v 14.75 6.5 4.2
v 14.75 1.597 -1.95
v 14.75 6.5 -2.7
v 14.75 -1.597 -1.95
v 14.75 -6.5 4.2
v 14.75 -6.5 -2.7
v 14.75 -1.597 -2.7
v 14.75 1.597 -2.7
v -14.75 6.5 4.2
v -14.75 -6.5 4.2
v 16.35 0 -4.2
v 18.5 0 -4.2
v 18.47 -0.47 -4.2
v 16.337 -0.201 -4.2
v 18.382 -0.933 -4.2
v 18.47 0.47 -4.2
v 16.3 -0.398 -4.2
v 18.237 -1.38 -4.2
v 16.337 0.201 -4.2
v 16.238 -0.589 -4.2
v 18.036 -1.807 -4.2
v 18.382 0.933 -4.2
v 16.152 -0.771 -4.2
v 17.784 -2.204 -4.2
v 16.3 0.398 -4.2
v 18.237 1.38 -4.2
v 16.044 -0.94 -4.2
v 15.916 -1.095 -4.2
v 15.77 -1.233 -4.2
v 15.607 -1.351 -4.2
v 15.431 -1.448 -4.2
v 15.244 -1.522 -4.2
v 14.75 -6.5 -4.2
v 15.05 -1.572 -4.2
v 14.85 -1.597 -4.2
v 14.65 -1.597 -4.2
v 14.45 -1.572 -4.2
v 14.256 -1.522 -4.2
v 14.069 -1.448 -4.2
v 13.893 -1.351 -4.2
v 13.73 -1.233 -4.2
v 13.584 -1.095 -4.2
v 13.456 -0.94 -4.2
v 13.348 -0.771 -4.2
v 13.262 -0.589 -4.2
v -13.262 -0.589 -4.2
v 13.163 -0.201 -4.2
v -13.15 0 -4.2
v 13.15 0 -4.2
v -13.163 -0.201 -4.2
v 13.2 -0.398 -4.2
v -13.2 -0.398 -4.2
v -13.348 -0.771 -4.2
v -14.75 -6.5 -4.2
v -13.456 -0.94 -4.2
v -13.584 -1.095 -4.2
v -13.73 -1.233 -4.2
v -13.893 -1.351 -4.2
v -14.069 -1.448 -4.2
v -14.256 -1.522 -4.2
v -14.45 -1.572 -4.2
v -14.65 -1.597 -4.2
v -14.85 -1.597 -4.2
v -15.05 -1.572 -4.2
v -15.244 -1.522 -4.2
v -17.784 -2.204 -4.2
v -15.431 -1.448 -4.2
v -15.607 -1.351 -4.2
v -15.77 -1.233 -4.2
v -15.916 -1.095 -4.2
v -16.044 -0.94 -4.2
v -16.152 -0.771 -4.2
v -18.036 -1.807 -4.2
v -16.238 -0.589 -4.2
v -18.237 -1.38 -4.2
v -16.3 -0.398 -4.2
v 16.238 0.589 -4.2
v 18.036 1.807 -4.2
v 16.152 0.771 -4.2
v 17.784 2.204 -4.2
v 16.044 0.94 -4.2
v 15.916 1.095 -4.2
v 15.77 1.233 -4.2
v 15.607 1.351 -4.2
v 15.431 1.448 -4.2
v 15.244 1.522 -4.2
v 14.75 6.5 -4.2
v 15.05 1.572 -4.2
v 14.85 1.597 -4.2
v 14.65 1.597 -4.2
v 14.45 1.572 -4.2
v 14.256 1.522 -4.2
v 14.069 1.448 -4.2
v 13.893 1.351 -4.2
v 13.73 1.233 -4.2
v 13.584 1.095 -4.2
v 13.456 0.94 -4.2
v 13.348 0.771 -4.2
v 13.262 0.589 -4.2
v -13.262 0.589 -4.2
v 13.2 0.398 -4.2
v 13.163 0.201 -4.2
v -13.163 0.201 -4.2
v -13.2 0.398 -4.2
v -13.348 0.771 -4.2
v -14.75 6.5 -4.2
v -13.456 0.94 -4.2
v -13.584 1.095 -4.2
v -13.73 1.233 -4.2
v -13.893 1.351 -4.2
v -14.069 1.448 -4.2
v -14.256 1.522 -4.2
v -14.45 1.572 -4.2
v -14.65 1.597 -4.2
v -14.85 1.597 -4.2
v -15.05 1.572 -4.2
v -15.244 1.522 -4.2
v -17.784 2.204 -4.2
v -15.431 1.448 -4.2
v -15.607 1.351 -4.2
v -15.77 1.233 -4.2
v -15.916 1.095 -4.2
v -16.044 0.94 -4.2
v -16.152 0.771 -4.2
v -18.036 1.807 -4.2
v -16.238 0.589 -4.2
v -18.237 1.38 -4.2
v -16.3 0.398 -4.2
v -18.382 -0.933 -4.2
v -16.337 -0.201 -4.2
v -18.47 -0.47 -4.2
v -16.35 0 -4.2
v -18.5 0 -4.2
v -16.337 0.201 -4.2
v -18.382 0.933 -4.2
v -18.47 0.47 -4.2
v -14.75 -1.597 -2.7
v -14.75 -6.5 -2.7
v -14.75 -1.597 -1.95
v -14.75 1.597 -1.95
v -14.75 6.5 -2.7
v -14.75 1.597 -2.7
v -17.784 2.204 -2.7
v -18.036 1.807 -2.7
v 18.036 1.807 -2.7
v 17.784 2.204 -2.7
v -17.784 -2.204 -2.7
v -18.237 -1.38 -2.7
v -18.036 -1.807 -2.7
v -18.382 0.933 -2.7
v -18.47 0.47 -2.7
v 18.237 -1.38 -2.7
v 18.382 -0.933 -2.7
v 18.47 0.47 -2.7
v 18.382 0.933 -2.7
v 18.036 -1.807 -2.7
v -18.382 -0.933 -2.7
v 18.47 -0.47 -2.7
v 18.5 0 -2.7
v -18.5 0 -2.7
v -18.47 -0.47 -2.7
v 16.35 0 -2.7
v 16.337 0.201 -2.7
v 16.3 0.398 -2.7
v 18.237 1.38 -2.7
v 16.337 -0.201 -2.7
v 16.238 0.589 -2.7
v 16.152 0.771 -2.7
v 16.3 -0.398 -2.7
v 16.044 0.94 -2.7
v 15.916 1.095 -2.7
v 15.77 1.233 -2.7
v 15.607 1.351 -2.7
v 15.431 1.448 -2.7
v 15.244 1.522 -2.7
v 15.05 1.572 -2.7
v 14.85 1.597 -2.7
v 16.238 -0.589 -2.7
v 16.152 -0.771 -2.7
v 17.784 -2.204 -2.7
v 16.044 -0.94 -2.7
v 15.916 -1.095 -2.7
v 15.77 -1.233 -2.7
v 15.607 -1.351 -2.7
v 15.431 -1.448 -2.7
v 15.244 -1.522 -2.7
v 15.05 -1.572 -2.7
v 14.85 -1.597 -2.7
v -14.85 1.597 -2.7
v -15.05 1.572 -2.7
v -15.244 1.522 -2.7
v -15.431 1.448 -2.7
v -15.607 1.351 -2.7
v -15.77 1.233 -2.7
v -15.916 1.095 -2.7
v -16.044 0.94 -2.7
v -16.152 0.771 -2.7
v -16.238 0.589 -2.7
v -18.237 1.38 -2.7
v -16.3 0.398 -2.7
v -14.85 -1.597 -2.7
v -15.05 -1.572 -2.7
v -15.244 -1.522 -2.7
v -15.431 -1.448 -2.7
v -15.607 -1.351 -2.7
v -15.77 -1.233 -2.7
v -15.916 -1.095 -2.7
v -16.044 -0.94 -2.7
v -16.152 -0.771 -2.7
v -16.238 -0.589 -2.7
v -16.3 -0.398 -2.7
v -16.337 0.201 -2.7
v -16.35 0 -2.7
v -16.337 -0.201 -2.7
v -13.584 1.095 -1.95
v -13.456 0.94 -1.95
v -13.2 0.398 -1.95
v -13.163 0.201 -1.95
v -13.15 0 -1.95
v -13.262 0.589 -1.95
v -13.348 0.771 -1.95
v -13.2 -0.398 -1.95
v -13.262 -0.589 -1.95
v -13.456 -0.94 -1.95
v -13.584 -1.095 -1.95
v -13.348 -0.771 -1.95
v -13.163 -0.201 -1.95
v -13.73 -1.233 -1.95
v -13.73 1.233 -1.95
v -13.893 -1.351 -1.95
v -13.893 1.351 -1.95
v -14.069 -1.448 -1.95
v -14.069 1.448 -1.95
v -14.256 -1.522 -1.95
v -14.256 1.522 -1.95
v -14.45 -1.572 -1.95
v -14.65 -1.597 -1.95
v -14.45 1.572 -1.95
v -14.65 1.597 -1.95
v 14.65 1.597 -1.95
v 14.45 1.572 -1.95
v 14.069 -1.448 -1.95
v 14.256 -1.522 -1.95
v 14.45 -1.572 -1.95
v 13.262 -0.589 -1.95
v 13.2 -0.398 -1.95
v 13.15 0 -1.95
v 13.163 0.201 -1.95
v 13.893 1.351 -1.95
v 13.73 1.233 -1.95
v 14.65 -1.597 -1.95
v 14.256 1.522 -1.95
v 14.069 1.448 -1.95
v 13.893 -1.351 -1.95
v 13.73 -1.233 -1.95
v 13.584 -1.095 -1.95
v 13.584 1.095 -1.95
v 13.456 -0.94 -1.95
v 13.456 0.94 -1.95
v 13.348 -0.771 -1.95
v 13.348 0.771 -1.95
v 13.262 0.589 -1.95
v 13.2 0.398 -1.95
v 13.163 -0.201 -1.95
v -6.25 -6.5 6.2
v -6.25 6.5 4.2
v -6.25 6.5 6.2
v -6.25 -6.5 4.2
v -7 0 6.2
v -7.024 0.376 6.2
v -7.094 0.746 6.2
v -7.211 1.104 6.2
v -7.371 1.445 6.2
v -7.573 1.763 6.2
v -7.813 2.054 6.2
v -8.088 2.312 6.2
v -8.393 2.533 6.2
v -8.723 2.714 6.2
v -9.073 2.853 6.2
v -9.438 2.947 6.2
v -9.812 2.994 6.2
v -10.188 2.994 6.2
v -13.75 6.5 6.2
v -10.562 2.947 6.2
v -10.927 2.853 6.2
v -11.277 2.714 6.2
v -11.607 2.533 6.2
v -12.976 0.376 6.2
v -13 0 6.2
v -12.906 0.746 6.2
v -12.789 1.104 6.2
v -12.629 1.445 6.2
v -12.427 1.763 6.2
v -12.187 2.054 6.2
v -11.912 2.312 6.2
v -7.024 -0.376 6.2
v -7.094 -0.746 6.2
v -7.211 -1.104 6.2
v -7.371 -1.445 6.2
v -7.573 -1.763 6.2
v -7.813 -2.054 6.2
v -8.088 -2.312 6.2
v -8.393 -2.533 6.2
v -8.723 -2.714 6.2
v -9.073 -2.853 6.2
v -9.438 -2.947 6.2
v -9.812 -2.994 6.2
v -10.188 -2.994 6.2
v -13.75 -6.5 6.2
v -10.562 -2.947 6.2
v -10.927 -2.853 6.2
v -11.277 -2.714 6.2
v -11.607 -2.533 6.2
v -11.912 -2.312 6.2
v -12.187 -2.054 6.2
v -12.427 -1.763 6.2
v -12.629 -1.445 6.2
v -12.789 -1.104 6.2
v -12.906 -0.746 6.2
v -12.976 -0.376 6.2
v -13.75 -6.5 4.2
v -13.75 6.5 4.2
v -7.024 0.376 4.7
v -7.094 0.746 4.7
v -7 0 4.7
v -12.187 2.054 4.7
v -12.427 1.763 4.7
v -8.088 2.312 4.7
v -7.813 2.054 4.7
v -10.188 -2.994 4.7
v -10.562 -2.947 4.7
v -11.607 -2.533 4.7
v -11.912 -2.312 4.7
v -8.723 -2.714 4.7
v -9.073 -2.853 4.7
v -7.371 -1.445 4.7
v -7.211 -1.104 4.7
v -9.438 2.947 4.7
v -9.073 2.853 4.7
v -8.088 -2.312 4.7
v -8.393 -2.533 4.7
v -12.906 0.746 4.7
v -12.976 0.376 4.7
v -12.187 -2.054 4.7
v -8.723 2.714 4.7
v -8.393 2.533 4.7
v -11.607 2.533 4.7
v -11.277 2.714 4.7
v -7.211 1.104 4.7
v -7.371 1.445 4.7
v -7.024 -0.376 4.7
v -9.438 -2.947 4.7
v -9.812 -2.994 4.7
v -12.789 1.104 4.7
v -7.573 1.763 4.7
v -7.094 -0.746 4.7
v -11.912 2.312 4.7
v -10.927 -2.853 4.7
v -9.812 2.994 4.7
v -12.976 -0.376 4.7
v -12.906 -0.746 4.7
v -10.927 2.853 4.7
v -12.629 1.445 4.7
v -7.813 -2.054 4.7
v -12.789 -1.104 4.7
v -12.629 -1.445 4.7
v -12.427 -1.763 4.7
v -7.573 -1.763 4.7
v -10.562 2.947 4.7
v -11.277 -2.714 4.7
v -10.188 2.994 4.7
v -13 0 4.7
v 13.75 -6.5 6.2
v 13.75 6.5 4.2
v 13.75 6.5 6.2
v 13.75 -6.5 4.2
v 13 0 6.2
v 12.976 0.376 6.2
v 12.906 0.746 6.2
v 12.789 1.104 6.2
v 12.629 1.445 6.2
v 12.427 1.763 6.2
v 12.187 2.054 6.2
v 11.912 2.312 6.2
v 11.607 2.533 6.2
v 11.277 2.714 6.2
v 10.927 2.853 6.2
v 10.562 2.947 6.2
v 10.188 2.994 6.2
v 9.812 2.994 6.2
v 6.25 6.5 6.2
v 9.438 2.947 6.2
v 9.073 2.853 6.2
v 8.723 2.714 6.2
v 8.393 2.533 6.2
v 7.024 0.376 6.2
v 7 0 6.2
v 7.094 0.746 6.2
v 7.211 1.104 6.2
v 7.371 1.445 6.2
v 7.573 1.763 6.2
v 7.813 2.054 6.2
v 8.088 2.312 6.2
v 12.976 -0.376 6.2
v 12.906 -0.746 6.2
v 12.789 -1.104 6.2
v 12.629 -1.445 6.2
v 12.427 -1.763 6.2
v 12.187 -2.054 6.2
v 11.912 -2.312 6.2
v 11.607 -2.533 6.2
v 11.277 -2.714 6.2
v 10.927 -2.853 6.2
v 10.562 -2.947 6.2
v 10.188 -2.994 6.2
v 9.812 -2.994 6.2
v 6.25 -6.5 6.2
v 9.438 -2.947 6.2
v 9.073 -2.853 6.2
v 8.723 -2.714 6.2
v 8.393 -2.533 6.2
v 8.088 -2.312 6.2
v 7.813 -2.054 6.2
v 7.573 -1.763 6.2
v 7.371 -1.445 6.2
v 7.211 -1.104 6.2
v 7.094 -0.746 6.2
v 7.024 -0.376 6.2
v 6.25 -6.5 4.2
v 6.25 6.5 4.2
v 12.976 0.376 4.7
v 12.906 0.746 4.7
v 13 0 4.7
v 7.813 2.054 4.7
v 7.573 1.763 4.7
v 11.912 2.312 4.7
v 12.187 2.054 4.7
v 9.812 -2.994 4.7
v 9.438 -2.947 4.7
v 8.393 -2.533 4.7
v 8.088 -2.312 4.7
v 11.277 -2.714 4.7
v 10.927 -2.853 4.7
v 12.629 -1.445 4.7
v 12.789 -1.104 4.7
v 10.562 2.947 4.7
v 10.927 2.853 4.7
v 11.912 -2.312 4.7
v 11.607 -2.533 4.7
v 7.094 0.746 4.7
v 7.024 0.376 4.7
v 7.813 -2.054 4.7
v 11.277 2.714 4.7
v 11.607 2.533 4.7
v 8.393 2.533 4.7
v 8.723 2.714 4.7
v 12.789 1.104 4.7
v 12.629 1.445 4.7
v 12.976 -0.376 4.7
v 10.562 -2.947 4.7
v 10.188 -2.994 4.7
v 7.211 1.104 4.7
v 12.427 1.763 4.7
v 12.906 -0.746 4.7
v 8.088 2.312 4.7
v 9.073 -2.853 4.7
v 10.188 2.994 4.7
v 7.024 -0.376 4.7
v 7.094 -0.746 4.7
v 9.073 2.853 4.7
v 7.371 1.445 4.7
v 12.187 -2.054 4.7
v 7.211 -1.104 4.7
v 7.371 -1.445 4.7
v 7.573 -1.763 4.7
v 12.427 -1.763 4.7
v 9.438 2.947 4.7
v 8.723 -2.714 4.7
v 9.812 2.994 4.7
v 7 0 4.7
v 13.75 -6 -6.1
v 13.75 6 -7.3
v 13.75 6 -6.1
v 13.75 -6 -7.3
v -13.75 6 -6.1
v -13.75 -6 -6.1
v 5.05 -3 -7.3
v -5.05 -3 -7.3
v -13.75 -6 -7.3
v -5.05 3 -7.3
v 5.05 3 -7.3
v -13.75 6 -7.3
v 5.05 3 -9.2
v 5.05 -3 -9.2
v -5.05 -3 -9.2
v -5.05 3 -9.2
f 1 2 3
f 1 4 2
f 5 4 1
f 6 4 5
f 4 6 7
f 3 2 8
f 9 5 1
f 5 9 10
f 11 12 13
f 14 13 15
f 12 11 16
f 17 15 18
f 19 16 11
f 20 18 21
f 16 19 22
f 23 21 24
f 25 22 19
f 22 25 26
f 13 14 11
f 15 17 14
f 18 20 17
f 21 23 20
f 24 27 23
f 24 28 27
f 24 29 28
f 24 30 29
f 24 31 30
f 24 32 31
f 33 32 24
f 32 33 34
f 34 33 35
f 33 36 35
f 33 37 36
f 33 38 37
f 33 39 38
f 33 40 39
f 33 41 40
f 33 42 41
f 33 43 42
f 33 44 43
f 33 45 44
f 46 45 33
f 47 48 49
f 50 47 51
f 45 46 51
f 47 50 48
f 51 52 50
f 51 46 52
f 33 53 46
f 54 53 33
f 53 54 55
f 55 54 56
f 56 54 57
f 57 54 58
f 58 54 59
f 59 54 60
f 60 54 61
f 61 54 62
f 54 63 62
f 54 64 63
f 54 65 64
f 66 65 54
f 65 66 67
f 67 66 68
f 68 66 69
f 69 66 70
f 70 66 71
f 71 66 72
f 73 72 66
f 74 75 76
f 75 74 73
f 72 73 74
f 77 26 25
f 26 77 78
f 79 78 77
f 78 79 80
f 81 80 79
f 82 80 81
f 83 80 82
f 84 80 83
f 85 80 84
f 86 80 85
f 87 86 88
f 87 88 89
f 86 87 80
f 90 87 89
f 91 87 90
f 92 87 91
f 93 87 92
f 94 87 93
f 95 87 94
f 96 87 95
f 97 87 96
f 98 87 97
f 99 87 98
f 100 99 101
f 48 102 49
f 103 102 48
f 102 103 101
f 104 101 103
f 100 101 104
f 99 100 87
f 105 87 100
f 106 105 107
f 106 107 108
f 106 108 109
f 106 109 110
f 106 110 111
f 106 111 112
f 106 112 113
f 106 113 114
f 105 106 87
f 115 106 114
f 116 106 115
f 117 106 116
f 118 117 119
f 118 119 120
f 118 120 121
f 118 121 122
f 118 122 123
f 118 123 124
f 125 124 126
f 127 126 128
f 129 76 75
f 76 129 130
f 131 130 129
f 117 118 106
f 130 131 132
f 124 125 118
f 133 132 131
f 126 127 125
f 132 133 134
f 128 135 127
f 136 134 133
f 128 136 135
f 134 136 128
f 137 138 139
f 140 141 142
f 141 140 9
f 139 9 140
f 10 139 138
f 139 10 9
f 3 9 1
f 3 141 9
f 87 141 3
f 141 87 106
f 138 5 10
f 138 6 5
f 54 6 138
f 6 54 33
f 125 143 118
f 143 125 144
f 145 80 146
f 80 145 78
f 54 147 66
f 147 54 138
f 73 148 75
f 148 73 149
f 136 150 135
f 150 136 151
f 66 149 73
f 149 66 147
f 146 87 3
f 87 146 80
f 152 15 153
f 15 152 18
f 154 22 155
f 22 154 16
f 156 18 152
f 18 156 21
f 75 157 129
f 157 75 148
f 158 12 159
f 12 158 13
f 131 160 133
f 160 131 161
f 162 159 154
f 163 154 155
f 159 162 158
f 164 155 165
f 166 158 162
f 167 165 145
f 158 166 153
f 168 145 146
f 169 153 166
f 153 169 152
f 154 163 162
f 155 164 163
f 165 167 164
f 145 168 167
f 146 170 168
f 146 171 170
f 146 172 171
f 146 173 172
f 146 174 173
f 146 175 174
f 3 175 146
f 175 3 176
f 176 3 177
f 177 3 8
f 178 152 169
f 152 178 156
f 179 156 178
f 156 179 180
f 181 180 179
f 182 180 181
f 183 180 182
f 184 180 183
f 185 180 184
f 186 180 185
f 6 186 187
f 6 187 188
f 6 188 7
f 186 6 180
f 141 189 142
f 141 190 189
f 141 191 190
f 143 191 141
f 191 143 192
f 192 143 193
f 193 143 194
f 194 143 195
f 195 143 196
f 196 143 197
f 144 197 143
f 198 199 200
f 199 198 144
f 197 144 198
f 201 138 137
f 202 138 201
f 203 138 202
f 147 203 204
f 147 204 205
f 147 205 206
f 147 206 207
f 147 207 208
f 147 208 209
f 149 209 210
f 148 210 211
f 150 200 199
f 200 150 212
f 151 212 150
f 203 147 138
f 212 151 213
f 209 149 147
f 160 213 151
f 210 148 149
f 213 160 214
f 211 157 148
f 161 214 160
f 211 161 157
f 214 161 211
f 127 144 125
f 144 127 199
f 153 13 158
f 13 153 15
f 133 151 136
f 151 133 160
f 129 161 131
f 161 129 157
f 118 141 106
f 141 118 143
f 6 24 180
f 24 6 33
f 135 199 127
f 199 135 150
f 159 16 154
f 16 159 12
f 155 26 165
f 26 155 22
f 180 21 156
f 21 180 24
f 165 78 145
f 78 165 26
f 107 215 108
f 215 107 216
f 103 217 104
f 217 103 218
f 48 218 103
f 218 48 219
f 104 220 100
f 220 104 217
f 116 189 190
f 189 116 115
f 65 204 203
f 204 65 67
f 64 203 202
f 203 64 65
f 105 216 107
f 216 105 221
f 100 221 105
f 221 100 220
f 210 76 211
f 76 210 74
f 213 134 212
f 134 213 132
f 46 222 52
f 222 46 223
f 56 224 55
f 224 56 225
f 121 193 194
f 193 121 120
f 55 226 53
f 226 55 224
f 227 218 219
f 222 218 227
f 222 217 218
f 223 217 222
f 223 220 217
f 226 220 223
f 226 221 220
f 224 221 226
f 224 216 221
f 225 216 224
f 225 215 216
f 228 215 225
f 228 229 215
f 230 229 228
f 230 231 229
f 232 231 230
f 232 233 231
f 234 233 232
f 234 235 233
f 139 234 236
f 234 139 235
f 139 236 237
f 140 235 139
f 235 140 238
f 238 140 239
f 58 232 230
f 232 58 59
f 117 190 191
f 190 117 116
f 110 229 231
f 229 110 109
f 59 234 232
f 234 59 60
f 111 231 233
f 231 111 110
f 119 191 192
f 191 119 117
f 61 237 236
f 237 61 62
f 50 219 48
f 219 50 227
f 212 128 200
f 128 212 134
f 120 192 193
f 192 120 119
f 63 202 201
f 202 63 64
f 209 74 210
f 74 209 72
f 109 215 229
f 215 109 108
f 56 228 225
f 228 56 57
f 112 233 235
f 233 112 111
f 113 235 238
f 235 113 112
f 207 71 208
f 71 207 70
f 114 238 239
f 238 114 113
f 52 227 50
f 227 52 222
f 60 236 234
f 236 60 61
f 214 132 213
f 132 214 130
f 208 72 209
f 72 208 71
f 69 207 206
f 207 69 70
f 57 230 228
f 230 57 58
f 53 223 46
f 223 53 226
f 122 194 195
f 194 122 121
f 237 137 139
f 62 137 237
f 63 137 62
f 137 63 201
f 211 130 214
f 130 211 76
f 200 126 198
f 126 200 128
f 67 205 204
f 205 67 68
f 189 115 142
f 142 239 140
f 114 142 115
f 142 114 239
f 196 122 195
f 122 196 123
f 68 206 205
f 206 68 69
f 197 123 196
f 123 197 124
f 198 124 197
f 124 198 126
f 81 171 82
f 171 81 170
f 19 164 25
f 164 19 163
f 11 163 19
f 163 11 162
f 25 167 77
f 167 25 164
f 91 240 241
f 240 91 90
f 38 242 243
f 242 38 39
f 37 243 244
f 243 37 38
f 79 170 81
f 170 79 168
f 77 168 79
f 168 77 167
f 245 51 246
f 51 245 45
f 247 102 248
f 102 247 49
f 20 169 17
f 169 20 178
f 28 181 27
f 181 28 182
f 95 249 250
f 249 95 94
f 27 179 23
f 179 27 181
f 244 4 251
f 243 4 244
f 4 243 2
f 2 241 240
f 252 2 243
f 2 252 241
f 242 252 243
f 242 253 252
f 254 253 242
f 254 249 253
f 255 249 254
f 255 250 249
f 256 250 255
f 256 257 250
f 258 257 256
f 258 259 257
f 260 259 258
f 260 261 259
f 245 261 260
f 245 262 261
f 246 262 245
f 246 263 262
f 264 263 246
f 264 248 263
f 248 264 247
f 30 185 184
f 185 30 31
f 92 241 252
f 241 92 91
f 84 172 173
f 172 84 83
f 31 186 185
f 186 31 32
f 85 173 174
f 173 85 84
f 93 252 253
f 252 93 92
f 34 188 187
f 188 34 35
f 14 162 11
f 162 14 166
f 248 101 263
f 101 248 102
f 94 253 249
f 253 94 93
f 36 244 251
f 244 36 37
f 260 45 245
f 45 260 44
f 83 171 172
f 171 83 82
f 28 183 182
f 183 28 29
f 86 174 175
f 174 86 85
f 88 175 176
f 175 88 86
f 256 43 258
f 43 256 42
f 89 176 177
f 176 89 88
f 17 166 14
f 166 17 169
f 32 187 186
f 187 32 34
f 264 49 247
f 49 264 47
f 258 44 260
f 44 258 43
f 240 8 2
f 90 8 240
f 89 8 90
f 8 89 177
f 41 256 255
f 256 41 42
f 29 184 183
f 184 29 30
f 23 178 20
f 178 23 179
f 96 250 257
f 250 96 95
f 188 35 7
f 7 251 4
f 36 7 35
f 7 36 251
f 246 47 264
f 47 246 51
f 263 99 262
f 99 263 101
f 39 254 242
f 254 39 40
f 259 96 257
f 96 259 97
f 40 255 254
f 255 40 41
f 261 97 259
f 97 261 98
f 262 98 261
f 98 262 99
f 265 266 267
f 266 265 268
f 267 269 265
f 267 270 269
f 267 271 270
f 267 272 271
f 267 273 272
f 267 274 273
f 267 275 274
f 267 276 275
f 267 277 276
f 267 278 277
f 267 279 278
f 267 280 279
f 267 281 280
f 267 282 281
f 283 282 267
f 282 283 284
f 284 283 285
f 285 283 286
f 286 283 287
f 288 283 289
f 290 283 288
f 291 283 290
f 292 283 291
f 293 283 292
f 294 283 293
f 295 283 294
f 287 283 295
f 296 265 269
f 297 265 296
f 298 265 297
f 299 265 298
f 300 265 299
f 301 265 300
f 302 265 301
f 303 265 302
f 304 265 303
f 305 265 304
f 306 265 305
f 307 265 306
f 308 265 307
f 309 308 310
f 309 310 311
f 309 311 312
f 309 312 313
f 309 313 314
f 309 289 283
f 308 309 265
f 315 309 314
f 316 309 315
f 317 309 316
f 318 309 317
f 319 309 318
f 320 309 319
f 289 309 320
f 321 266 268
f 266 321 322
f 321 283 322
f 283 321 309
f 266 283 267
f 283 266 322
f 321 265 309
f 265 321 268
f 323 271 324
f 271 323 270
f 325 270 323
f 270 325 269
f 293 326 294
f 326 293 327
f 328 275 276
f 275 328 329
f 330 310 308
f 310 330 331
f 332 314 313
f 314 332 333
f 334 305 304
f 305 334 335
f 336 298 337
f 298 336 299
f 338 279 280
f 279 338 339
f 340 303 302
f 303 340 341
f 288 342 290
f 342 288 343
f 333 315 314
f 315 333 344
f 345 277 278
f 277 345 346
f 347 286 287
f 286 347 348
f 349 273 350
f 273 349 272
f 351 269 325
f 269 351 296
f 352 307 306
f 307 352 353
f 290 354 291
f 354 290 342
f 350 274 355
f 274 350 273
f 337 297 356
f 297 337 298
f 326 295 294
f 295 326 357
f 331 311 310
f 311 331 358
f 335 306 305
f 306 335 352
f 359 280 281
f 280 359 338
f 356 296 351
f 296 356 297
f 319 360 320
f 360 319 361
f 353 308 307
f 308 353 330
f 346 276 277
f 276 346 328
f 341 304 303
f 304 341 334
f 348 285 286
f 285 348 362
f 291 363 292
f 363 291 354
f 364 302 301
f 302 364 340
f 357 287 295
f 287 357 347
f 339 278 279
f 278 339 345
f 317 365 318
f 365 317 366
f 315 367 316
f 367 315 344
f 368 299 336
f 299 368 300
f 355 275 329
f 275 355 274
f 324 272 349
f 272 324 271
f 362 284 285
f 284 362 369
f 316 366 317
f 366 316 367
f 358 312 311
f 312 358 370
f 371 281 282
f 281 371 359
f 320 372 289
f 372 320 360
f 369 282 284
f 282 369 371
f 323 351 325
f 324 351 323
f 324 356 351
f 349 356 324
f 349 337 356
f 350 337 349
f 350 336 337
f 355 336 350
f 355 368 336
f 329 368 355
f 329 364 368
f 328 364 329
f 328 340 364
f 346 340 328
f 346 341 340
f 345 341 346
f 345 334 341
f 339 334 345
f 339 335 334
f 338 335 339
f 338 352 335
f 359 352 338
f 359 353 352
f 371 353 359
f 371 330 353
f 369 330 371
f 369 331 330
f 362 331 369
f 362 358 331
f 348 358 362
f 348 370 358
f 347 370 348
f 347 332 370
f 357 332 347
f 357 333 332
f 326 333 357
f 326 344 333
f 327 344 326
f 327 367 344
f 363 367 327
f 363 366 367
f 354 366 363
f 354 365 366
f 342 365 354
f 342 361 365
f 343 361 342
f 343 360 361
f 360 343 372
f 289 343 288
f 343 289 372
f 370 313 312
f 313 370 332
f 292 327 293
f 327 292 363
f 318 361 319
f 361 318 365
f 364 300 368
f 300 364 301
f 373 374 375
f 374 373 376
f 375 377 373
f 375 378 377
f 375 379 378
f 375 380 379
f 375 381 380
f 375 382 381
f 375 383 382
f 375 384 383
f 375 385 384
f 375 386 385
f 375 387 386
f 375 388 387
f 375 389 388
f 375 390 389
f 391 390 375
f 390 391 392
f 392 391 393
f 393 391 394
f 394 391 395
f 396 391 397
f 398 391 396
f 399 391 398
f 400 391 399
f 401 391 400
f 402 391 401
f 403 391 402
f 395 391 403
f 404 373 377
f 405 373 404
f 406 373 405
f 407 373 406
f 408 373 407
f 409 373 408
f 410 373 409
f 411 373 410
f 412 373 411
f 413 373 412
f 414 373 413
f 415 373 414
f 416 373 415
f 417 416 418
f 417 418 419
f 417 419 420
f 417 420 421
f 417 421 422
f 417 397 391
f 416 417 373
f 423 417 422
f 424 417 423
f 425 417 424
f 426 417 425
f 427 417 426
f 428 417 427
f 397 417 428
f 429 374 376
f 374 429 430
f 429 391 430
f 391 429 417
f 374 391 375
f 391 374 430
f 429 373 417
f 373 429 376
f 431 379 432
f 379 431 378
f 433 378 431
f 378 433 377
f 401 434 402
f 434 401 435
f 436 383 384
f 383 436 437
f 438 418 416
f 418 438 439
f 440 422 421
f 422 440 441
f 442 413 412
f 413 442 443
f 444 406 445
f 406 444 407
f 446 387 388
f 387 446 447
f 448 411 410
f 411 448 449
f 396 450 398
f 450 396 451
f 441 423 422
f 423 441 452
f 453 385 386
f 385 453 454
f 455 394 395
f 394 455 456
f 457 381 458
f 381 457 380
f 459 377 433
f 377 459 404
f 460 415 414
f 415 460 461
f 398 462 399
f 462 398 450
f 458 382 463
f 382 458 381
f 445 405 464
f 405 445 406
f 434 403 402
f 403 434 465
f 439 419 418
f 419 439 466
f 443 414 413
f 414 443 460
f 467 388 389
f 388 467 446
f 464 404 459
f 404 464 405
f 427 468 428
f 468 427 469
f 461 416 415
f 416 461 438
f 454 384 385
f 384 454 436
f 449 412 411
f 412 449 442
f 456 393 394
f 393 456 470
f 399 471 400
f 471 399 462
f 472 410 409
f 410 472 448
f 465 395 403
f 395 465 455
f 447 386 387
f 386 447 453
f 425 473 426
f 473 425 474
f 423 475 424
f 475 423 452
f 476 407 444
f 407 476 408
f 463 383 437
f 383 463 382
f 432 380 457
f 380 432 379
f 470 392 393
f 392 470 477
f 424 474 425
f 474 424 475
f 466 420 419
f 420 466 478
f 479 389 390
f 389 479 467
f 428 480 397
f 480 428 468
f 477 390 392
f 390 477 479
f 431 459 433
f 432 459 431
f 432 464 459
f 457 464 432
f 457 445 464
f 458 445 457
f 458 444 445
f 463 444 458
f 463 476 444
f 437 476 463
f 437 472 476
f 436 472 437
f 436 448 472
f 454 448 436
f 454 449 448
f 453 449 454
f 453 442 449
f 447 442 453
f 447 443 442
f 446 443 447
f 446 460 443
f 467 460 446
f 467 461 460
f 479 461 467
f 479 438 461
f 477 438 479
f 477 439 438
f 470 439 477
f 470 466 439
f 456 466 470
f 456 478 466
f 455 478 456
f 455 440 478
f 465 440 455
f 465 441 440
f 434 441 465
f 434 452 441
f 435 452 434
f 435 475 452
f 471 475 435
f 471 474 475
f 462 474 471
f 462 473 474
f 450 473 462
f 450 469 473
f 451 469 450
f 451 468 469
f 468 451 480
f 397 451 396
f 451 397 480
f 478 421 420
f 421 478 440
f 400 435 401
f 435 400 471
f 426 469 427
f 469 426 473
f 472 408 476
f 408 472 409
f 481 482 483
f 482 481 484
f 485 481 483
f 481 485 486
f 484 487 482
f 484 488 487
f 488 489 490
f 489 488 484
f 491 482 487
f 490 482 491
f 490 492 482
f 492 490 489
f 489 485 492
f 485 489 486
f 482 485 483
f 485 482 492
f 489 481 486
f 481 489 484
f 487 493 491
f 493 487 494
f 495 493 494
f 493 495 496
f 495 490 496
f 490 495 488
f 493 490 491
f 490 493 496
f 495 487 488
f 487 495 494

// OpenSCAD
/*
 * Sharp GP2Y0A21YK0F Distance Sensor
 * Units: mm
 */

$fn = 50;

// 寸法定義
BODY_L = 29.5;
BODY_W = 13.0;
BODY_H = 8.4;

FLANGE_L = 37.0;
FLANGE_H = 1.5; // 厚み（図中 2-1.5 参照）
HOLE_DIST = 14.75 * 2; // 29.5
HOLE_D = 3.2;

LENS_BASE_W = 7.5; // R3.75 * 2
LENS_PITCH = 20.0;
LENS_PROTRUSION = 2.0;

PWB_H = 1.2;
TOTAL_H = 13.5;
CONN_W = 10.1;

// 色の定義
COLOR_BODY = [0.2, 0.2, 0.2];
COLOR_LENS = [0.1, 0.1, 0.1];
COLOR_PWB = [0.2, 0.3, 0.1];
COLOR_CONN = [0.9, 0.9, 0.9];

module gp2y0a21yk0f() {
    // 1. メインボディ (Black plastic case)
    // 原点を本体の中心にするため、Z方向は -BODY_H/2 から BODY_H/2
    color(COLOR_BODY)
    difference() {
        union() {
            // 中心ブロック
            cube([BODY_L, BODY_W, BODY_H], center = true);
            
            // 取付フランジ (左右の耳)
            translate([0, 0, -BODY_H/2 + FLANGE_H/2])
            hull() {
                cube([BODY_L, BODY_W, FLANGE_H], center = true);
                for(s = [-1, 1]) {
                    translate([s * (FLANGE_L/2 - 3.75), 0, 0])
                    cylinder(d = 7.5, h = FLANGE_H, center = true);
                }
            }
        }
        
        // 取付穴
        for(s = [-1, 1]) {
            translate([s * HOLE_DIST/2, 0, -BODY_H/2])
            cylinder(d = HOLE_D, h = FLANGE_H * 3, center = true);
        }
    }

    // 2. レンズ部分 (Lens Case / Protrusions)
    color(COLOR_LENS) {
        for(s = [-1, 1]) {
            translate([s * LENS_PITCH/2, 0, BODY_H/2 + LENS_PROTRUSION/2])
            difference() {
                // レンズ外装
                cube([LENS_BASE_W, BODY_W, LENS_PROTRUSION], center = true);
                // 実際のレンズっぽい窪み（装飾的表現）
                translate([0, 0, 0.5])
                cylinder(d = 6, h = LENS_PROTRUSION, center = true);
            }
        }
    }

    // 3. PWB (基板部分)
    // 図面より、全高 13.5mm。上端から下端まで。
    // 上面レンズ端(BODY_H/2 + 2.0) から PWB下面までの距離を合わせる
    pwb_z_pos = BODY_H/2 + LENS_PROTRUSION - 13.5 + PWB_H/2;
    
    translate([0, 0, pwb_z_pos])
    color(COLOR_PWB)
    cube([BODY_L - 2, BODY_W - 1, PWB_H], center = true);

    // 4. コネクタ (Connector)
    // PWBの下に配置
    color(COLOR_CONN)
    translate([0, 0, pwb_z_pos - PWB_H/2 - (13.5 - 8.4 - 2.0 - 1.2)/2])
    cube([CONN_W, 6.0, 13.5 - 8.4 - 2.0 - 1.2], center = true);
}

// 実行
gp2y0a21yk0f();
